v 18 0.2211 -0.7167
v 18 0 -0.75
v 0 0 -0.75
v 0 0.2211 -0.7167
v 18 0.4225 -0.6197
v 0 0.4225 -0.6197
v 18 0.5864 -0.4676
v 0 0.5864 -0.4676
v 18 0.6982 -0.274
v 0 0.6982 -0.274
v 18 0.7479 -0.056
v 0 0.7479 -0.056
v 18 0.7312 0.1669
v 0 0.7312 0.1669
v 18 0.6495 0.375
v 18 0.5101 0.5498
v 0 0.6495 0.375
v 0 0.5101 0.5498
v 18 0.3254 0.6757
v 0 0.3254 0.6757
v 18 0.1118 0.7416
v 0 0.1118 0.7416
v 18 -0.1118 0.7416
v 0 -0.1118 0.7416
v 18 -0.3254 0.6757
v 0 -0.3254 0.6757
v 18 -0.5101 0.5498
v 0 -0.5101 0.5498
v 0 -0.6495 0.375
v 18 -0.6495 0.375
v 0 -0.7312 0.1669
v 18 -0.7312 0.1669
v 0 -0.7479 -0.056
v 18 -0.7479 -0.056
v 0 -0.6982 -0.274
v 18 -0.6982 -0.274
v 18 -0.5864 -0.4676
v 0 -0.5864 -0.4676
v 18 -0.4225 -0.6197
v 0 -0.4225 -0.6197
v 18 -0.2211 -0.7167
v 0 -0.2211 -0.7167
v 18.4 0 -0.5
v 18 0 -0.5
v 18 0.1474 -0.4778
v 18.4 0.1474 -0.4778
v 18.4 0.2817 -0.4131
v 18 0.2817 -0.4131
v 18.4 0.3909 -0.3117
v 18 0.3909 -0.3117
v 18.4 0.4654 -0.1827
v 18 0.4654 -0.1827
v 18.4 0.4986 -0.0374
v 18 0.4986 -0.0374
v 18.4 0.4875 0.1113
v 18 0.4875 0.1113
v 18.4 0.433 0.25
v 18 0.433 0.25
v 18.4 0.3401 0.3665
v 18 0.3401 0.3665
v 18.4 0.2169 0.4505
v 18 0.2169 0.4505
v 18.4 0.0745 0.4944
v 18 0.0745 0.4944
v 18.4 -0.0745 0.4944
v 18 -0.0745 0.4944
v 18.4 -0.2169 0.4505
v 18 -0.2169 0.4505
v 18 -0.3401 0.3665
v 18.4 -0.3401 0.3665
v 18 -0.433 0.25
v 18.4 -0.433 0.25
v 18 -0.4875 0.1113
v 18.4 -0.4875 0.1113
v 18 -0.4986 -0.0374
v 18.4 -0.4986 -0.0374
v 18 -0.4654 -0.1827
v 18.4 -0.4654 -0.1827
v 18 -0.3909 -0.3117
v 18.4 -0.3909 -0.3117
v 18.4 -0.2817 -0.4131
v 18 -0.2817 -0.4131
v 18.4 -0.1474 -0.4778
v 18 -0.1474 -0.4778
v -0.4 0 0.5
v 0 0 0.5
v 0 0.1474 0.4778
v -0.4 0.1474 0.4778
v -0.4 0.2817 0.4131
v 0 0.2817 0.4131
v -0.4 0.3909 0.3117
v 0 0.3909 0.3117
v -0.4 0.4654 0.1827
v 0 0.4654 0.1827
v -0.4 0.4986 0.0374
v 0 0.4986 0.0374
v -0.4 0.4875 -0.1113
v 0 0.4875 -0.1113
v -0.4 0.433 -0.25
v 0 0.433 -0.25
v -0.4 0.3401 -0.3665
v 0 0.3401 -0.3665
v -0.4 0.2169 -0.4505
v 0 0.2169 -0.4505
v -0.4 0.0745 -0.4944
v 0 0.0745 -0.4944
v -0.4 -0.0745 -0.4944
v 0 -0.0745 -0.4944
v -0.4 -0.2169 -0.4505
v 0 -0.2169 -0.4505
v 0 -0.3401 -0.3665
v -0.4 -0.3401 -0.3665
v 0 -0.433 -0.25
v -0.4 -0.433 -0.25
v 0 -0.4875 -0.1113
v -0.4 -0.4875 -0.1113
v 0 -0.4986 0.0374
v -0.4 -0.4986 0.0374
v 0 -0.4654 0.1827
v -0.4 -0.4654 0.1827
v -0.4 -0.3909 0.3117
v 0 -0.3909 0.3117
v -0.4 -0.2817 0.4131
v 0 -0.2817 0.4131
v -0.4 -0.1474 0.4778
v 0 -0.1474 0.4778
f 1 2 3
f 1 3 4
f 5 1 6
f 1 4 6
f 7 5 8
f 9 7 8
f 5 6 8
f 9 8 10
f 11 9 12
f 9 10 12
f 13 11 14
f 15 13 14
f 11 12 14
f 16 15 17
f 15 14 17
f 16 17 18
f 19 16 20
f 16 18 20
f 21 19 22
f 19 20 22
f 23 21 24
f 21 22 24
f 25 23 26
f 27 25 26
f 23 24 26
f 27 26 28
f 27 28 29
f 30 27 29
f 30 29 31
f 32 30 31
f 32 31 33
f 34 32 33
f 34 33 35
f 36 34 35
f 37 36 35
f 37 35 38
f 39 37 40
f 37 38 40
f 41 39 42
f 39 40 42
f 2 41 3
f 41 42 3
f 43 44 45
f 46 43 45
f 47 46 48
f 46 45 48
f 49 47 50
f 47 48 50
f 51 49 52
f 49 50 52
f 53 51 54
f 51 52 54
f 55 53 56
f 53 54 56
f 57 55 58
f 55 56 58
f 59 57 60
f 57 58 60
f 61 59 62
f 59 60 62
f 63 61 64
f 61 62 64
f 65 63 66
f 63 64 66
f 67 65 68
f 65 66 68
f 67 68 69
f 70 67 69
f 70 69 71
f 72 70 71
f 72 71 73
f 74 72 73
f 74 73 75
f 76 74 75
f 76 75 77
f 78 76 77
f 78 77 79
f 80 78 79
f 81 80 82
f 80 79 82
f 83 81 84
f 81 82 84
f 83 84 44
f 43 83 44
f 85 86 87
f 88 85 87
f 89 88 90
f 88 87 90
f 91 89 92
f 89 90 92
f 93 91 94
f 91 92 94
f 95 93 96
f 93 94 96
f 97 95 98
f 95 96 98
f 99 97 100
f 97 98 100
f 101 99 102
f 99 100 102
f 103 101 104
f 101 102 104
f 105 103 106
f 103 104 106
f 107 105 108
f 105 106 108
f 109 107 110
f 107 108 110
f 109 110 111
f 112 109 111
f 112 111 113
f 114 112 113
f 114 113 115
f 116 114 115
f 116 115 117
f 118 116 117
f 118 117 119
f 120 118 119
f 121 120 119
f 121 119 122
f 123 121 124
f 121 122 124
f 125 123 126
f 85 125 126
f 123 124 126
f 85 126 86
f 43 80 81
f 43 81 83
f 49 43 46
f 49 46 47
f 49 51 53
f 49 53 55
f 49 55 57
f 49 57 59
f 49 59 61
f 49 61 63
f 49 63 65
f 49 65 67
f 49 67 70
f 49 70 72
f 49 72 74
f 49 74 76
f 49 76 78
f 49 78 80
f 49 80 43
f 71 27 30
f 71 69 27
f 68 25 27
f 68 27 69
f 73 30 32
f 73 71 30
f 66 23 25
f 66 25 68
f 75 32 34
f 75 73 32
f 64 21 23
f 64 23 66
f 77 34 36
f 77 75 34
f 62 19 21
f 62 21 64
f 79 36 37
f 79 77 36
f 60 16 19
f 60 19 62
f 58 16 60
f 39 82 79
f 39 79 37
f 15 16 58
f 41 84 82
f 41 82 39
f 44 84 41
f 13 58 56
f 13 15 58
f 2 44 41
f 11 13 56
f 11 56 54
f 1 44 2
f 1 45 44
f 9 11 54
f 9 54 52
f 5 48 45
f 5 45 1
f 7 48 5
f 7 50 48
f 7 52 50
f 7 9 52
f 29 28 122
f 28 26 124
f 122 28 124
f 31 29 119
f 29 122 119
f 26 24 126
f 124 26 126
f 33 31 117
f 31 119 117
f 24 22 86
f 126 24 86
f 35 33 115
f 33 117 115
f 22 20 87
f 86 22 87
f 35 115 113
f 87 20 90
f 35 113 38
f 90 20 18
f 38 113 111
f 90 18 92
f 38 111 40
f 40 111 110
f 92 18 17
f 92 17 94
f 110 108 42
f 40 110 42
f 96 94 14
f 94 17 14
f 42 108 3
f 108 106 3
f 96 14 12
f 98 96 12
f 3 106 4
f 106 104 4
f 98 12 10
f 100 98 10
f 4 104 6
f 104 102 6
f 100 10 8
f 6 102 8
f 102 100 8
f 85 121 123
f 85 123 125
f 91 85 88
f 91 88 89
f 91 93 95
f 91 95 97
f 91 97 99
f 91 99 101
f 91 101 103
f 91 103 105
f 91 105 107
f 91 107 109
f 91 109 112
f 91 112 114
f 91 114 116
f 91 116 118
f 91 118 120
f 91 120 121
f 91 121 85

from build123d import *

# Parameters (mm, degrees)
SKETCH1_R           = 0.75
BOSS_EXTRUDE1_DEPTH = 18
SKETCH2_R           = 0.5
BOSS_EXTRUDE2_DEPTH = 0.4
SKETCH3_R           = 0.5
BOSS_EXTRUDE3_DEPTH = 0.4


with BuildPart() as part:
    # Sketch1 → Boss-Extrude1 (new body)
    with BuildSketch(Plane(origin=(0, 0, 0), x_dir=(0, 0, -1), z_dir=(1, 0, 0))):
        Circle(SKETCH1_R)
    extrude(amount=BOSS_EXTRUDE1_DEPTH)

    # Sketch2 → Boss-Extrude2 (add)
    with BuildSketch(Plane(origin=(18, 0, 0), x_dir=(0, 0, -1), z_dir=(1, 0, 0))):
        Circle(SKETCH2_R)
    extrude(amount=BOSS_EXTRUDE2_DEPTH)

    # Sketch3 → Boss-Extrude3 (add)
    with BuildSketch(Plane.ZY):
        Circle(SKETCH3_R)
    extrude(amount=BOSS_EXTRUDE3_DEPTH)


solid = part.part
